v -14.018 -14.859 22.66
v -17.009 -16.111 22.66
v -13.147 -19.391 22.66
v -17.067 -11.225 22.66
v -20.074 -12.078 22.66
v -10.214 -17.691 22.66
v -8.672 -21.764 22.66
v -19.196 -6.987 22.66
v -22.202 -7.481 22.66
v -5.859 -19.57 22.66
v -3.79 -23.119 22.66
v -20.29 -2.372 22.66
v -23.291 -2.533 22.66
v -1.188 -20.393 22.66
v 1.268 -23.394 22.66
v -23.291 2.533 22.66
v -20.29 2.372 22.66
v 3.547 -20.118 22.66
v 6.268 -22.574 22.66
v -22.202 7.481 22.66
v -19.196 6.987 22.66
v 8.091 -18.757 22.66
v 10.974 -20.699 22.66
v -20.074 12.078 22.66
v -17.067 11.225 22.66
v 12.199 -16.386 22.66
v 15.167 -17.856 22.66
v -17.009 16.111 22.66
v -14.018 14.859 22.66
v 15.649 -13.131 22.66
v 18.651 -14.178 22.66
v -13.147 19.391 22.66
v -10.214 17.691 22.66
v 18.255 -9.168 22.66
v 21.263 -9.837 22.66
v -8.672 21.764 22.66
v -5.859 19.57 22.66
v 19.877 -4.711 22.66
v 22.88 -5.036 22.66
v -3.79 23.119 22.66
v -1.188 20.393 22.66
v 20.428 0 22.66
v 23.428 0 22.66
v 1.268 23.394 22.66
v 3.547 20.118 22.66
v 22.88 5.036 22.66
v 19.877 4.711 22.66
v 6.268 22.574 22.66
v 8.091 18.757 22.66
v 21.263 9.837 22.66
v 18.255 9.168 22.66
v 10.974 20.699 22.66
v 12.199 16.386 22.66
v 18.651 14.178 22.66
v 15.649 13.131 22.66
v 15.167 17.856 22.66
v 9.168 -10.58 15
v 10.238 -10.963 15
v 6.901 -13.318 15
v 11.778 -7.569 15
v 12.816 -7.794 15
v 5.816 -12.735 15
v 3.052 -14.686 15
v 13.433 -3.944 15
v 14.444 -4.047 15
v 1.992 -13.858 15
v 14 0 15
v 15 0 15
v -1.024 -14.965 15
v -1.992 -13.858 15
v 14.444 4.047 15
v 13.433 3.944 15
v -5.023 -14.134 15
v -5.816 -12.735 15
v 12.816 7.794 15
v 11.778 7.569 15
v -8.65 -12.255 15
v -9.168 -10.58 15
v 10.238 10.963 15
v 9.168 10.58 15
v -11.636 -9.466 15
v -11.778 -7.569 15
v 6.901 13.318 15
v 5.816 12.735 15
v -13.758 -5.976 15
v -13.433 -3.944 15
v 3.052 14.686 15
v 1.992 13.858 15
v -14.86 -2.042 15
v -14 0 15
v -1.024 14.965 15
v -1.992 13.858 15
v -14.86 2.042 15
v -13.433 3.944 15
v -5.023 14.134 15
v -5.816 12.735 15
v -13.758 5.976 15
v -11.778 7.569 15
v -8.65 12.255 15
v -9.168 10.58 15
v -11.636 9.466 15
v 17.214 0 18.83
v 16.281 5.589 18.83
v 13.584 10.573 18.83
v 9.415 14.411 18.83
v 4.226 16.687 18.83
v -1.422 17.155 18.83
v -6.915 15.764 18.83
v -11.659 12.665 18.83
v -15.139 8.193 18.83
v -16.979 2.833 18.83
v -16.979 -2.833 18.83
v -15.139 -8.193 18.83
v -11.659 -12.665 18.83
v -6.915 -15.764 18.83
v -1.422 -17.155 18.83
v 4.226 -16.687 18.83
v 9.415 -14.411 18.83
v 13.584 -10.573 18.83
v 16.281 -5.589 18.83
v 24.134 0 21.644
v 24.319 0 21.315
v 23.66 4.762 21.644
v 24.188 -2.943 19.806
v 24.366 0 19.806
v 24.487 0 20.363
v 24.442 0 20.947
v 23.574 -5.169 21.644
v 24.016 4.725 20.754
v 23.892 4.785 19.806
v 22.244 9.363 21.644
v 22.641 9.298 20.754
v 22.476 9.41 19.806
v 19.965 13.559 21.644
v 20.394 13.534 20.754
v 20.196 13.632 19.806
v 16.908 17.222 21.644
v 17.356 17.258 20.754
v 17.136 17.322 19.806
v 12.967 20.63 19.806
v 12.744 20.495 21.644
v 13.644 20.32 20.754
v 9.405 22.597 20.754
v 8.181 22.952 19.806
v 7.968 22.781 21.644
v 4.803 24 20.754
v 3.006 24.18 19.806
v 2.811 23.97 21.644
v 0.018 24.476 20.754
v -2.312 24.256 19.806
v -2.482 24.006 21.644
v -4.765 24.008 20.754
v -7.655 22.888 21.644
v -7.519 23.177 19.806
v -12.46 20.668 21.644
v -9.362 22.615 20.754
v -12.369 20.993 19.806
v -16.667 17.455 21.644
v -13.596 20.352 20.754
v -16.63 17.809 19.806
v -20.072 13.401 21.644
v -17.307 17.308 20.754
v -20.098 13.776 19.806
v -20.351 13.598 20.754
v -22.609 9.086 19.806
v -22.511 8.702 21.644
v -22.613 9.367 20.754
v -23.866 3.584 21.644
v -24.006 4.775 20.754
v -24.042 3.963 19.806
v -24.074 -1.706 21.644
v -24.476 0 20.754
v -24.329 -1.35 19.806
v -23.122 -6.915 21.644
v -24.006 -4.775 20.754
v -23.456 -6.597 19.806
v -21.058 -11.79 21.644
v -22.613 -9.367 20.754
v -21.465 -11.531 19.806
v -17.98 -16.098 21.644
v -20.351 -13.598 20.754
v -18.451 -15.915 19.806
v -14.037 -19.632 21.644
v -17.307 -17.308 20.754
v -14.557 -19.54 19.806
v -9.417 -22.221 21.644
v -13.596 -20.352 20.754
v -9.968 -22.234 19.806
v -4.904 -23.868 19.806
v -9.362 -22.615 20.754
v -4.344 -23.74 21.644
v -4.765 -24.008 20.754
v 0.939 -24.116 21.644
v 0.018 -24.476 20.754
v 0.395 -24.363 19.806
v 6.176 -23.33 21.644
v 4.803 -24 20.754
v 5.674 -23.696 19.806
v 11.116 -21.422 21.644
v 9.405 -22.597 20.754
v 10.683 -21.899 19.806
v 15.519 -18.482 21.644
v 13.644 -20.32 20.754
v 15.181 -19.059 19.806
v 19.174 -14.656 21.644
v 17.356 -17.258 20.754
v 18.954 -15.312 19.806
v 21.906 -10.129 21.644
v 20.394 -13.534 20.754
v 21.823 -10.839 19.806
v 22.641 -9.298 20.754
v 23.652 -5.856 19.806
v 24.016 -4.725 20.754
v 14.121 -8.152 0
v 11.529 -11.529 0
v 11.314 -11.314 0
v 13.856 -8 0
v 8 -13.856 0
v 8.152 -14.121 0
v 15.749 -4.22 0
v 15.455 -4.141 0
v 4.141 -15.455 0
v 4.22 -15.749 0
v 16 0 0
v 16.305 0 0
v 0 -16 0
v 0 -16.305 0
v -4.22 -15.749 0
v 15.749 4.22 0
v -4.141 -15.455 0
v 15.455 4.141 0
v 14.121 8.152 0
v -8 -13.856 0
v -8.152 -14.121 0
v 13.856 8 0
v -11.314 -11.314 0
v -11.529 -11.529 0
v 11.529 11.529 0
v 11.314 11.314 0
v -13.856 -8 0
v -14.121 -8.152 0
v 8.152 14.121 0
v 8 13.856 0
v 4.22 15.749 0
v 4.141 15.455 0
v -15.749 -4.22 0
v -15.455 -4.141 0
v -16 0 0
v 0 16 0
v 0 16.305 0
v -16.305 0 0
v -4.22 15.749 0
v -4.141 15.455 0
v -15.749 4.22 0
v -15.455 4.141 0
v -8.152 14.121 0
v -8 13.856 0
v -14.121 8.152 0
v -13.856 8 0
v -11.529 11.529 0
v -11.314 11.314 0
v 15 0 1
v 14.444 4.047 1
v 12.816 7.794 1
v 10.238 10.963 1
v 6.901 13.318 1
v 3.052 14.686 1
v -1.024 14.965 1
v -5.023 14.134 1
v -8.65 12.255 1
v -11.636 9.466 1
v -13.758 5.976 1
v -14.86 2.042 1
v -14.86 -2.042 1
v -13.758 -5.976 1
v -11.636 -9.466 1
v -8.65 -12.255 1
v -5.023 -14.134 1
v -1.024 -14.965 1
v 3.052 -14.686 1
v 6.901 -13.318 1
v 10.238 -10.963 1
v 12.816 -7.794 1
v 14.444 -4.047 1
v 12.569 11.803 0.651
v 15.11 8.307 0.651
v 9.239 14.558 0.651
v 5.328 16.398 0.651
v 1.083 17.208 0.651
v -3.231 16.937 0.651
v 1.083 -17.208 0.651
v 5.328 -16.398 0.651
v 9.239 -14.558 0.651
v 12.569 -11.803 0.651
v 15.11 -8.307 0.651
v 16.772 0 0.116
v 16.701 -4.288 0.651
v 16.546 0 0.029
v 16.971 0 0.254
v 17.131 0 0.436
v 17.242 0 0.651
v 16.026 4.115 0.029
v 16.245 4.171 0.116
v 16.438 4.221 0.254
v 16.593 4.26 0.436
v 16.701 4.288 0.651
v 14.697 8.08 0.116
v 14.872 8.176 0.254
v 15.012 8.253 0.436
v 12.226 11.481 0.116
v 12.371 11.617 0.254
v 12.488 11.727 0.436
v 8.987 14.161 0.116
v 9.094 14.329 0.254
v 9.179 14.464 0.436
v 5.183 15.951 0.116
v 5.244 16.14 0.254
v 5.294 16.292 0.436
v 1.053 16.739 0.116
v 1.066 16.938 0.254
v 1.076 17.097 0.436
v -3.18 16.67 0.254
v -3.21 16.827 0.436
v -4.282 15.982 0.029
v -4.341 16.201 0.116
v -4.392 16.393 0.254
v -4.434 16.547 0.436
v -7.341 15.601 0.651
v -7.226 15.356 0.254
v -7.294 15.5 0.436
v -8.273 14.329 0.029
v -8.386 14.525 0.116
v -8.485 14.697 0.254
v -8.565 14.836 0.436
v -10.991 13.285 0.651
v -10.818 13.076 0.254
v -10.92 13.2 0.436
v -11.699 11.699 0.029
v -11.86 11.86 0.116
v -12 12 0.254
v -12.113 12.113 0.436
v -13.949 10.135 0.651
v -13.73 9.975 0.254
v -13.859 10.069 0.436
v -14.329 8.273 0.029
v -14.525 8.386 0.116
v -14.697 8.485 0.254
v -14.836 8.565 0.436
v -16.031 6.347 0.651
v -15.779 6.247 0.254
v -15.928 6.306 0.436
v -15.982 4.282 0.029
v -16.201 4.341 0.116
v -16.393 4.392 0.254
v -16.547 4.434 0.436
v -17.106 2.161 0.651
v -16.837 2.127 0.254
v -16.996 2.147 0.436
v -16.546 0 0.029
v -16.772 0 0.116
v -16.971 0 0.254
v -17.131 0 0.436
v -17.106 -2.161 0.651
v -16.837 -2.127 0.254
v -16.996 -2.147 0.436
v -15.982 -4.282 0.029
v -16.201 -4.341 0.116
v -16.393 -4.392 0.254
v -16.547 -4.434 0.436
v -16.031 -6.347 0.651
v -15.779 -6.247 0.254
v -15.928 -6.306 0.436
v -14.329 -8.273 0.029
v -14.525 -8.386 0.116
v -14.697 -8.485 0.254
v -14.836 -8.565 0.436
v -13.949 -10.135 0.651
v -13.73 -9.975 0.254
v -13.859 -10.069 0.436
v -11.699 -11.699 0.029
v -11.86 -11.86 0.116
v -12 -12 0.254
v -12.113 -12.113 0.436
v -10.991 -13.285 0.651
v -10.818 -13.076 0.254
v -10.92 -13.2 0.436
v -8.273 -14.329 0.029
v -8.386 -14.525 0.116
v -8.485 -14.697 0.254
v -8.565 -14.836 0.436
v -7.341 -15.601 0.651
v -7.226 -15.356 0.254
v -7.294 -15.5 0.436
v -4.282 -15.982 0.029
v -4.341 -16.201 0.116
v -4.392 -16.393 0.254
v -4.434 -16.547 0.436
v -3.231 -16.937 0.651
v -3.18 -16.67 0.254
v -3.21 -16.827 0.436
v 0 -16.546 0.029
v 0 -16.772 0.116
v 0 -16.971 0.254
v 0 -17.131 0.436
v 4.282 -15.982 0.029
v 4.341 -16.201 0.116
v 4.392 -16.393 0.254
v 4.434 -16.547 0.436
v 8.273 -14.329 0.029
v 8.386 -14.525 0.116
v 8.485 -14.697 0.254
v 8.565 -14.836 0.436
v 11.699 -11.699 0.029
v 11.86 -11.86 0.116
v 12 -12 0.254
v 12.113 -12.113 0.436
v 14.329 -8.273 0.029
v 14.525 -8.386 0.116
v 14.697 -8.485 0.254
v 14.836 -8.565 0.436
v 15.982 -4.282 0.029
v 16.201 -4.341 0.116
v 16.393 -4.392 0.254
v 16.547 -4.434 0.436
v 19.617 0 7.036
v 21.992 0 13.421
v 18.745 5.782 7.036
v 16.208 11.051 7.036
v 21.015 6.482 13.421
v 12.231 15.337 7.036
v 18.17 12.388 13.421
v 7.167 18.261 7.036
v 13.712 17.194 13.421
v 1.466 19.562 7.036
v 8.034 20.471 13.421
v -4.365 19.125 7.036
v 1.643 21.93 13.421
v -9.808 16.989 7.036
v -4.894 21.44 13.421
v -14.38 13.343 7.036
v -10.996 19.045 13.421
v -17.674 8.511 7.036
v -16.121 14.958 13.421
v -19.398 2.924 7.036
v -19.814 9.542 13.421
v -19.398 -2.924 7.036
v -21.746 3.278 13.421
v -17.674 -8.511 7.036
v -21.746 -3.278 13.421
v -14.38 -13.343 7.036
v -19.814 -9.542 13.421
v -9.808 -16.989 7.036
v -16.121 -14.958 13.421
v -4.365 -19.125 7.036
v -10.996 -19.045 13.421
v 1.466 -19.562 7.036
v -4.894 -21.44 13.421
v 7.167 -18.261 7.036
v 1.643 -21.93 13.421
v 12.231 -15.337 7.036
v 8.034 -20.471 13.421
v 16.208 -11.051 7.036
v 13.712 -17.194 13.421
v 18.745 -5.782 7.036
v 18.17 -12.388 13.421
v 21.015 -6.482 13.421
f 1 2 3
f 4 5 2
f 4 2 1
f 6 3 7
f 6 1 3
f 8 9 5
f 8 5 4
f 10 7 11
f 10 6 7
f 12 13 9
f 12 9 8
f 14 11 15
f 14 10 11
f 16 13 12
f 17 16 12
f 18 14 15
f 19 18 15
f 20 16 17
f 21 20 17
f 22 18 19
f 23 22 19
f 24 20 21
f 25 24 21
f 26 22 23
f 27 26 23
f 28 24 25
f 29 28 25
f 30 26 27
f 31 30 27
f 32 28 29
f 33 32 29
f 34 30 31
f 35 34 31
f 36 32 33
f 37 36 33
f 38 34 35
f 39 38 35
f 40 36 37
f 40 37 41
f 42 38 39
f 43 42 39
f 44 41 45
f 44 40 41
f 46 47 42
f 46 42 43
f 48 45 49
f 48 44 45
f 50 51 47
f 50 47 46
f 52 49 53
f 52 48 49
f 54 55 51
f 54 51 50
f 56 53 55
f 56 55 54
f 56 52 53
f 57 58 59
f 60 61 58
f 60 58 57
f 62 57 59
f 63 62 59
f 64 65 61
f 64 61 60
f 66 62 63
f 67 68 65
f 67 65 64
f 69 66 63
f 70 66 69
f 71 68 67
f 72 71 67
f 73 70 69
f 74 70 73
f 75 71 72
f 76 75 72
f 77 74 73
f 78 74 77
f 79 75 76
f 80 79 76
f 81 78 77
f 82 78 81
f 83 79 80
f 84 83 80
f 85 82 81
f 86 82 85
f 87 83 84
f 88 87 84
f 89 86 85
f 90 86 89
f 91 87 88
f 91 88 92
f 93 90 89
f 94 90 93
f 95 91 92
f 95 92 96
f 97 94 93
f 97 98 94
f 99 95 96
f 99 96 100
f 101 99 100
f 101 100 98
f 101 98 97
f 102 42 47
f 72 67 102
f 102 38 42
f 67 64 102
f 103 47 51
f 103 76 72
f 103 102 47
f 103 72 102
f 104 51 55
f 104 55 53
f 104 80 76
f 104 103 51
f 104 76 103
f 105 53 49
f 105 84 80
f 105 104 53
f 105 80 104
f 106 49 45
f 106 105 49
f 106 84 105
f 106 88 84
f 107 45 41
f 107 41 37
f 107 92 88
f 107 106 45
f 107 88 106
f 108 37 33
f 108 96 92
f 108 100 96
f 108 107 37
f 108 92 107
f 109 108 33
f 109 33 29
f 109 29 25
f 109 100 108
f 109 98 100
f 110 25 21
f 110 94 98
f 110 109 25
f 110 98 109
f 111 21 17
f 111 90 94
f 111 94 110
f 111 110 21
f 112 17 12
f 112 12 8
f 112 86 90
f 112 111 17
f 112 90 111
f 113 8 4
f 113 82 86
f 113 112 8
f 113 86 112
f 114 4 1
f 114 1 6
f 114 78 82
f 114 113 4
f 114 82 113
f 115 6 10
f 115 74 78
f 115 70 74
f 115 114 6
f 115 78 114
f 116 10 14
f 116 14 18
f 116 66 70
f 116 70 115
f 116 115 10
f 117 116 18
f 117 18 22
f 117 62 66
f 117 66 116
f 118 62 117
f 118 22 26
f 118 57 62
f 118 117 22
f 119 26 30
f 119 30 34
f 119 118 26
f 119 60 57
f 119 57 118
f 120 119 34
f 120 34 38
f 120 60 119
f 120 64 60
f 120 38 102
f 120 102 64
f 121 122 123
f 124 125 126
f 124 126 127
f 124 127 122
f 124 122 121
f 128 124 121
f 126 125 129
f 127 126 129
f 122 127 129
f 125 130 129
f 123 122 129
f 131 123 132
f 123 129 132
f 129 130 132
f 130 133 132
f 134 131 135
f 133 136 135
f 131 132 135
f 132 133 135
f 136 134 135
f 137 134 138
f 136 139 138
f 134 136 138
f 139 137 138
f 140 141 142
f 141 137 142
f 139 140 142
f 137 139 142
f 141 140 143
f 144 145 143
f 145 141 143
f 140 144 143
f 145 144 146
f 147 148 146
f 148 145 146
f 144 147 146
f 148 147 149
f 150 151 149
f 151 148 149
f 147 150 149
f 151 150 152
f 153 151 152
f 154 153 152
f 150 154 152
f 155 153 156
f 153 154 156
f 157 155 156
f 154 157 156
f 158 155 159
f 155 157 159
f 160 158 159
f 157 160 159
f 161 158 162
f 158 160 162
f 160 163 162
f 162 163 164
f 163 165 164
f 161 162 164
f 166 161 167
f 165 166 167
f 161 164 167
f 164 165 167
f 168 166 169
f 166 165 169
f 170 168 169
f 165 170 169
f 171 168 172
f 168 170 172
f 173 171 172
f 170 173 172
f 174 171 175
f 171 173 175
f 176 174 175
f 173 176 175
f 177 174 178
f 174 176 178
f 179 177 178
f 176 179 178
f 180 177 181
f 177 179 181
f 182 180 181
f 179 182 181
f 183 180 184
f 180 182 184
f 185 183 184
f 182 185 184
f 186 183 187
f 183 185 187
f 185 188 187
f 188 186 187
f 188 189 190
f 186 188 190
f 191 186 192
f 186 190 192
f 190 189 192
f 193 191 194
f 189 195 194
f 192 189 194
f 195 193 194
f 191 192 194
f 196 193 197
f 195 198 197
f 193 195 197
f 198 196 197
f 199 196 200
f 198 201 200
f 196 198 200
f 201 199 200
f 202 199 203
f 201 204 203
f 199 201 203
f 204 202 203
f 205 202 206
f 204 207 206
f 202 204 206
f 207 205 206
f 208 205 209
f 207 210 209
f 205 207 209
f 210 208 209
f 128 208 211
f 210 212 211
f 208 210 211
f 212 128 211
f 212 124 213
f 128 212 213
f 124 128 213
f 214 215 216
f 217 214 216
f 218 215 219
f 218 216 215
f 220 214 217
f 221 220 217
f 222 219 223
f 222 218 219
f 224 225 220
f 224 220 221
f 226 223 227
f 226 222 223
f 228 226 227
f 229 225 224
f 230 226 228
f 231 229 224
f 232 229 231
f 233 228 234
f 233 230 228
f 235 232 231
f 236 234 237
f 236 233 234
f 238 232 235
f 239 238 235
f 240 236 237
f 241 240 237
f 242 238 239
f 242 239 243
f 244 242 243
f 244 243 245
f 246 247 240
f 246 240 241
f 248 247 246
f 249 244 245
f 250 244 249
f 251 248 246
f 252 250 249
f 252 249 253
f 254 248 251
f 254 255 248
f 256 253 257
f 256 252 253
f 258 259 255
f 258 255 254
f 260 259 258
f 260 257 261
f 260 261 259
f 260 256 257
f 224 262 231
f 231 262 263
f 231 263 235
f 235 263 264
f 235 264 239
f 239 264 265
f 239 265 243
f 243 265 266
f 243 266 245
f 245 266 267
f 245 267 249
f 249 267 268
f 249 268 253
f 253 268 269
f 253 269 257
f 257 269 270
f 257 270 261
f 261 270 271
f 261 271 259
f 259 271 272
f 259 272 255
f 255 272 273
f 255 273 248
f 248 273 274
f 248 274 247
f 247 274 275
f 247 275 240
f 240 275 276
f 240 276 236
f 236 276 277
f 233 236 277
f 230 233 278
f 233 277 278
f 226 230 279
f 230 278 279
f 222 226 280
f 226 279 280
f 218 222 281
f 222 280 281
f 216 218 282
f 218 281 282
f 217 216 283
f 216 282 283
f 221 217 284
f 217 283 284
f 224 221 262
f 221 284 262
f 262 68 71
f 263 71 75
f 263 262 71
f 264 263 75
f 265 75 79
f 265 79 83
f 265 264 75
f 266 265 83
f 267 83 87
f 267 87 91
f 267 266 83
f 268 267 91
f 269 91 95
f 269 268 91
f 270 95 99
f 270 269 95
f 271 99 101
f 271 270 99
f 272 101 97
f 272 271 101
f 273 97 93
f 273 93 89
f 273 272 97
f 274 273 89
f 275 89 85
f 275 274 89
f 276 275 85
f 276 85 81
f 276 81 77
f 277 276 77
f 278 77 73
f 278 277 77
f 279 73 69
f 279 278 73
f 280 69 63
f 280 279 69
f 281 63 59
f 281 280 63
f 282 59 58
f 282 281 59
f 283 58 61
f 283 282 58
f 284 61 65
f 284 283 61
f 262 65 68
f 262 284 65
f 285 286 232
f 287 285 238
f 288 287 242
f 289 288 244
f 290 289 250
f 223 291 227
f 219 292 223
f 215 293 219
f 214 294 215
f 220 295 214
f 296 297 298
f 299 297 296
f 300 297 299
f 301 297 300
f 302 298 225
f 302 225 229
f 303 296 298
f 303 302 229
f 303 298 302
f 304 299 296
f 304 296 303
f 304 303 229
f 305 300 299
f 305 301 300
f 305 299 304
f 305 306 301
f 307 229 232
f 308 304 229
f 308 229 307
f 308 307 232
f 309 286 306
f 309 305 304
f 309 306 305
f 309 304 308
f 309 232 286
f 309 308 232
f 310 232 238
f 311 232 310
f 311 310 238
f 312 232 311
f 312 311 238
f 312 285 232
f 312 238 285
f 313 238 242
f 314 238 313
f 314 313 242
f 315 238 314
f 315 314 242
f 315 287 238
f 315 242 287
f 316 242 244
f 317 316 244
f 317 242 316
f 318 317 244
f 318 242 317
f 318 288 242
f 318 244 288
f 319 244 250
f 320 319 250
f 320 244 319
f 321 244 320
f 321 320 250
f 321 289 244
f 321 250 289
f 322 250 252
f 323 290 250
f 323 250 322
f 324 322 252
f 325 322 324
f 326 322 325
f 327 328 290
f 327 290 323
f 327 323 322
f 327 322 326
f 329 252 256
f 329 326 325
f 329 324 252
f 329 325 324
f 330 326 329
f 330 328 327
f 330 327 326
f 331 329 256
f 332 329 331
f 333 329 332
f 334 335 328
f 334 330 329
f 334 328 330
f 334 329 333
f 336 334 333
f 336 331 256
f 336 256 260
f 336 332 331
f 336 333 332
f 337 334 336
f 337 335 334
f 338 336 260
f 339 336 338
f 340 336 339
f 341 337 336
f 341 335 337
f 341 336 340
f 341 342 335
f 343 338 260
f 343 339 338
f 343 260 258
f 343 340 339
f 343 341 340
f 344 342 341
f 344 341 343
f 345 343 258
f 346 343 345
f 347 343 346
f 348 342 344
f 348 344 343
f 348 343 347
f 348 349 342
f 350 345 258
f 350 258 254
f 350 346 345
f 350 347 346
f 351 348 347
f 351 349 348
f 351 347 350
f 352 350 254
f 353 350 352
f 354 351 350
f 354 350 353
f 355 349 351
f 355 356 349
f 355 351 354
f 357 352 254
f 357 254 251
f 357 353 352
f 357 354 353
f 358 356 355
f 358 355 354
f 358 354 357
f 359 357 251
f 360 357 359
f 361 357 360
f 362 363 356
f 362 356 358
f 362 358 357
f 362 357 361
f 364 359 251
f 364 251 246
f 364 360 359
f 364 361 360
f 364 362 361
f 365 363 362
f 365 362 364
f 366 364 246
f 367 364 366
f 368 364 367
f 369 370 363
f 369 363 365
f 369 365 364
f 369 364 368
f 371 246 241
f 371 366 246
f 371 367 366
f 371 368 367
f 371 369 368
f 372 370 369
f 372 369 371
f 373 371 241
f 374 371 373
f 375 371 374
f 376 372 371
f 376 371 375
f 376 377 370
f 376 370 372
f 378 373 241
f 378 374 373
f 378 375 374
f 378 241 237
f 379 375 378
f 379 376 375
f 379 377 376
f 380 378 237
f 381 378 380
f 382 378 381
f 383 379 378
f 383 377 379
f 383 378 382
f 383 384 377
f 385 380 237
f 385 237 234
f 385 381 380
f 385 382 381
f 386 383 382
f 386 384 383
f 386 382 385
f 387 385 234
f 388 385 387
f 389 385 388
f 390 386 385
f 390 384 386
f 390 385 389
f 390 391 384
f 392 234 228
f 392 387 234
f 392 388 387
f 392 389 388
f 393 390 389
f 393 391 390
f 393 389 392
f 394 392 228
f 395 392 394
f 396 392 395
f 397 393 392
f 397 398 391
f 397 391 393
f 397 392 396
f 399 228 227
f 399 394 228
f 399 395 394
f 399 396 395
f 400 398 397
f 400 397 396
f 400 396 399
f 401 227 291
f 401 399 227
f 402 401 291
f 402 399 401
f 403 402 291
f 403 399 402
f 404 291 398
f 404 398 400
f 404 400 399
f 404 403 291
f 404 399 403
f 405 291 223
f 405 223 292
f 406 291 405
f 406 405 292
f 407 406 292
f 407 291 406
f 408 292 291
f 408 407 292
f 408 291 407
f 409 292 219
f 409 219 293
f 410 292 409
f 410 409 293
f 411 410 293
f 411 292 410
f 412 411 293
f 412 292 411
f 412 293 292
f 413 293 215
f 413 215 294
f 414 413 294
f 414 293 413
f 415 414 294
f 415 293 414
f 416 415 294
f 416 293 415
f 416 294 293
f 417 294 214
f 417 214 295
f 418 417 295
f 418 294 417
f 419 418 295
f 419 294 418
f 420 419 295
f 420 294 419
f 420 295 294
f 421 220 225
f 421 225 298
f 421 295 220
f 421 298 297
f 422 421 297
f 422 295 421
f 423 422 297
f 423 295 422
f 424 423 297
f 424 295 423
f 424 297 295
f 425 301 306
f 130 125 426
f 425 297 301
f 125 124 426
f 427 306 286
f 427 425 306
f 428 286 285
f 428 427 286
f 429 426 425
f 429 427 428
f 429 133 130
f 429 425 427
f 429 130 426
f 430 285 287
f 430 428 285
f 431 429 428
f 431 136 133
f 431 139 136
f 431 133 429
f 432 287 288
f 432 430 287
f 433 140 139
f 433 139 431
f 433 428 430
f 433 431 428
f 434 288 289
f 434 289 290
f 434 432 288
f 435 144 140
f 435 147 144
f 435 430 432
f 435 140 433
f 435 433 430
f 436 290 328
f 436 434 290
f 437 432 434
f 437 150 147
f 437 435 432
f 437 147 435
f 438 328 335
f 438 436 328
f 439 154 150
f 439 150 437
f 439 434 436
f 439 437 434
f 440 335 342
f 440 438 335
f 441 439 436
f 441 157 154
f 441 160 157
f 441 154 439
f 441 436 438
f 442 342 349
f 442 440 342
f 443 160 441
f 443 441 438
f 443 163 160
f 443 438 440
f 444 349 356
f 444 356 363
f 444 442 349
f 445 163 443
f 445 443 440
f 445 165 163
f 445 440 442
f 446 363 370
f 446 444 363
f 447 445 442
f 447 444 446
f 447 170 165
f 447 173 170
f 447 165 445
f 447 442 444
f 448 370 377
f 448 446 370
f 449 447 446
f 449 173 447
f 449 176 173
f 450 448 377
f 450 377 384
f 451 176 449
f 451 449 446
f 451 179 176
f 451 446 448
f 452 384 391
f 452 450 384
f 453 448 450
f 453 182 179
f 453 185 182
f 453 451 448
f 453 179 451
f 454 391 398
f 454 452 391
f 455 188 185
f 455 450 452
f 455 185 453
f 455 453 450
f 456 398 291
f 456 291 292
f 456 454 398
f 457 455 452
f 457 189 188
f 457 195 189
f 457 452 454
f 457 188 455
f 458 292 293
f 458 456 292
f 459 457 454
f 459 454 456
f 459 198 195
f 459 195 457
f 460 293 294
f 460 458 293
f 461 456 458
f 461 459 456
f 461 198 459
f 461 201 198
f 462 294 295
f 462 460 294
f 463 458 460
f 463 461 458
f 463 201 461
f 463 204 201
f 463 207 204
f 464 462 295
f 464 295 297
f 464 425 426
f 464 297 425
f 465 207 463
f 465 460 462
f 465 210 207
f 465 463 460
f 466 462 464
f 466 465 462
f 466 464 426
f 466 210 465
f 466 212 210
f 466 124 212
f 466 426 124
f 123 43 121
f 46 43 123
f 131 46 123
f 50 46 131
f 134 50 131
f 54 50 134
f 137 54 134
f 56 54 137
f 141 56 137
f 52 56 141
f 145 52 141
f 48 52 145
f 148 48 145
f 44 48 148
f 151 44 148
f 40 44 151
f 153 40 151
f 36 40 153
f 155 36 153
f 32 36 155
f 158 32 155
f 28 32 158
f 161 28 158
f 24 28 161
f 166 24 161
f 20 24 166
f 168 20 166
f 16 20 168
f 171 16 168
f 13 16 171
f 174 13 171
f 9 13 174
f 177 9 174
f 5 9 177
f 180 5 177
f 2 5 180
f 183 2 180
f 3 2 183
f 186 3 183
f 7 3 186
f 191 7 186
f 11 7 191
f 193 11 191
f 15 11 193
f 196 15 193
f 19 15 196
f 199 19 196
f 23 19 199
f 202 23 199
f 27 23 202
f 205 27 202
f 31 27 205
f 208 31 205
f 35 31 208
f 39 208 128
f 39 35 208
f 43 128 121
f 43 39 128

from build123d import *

# Parameters (mm, degrees)
F2_SIZE = 2
F3_R    = 2
F4_SIZE = 1
F5_R    = 1


with BuildPart() as f1:
    # F0 (on Front) → F1 (revolve)
    with BuildSketch(Plane.XZ):
        Polygon((15, 15), (15, 0), (17, 0), (25.4278760969, 22.6604444312), (20.4278760969, 22.6604444312), (14, 15), align=None)
    revolve(axis=Axis((0, 0, 7.5), (0, 0, 1)))

    # F2
    f2_edges = [f1.edges().sort_by_distance(p)[0] for p in [
        (-25.427876, 0, 22.660444),
    ]]
    chamfer(f2_edges, length=F2_SIZE)

    # F3
    f3_edges = [f1.edges().sort_by_distance(p)[0] for p in [
        (-24.730693, 0, 20.785895),
    ]]
    fillet(f3_edges, radius=F3_R)

    # F4
    f4_edges = [f1.edges().sort_by_distance(p)[0] for p in [
        (-15, 0, 0),
    ]]
    chamfer(f4_edges, length=F4_SIZE)

    # F5
    f5_edges = [f1.edges().sort_by_distance(p)[0] for p in [
        (-17, 0, 0),
    ]]
    fillet(f5_edges, radius=F5_R)


solid = f1.part
